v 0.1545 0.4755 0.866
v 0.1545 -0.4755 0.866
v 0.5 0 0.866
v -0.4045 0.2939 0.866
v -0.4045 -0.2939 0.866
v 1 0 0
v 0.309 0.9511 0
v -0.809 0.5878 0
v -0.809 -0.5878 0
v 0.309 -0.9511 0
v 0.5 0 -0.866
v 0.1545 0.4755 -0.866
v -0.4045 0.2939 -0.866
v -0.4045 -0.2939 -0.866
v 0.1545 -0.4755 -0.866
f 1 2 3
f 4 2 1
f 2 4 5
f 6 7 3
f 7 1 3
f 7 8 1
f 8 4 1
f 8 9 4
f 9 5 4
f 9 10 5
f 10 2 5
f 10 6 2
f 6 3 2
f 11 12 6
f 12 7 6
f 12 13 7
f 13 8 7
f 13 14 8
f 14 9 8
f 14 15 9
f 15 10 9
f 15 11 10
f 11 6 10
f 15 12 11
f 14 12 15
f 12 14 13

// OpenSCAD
intersection() {cube(12, center=true); sphere(8);}

difference() {
    union() {
    sphere(20);
    translate([0,0,20 *sin(30)])
    cylinder(30,20 * cos(30),0);
}
rotate([45,0,0])
translate([-20,0,0])
cube([40,5,40]);
}

!sphere(1,center=true);
